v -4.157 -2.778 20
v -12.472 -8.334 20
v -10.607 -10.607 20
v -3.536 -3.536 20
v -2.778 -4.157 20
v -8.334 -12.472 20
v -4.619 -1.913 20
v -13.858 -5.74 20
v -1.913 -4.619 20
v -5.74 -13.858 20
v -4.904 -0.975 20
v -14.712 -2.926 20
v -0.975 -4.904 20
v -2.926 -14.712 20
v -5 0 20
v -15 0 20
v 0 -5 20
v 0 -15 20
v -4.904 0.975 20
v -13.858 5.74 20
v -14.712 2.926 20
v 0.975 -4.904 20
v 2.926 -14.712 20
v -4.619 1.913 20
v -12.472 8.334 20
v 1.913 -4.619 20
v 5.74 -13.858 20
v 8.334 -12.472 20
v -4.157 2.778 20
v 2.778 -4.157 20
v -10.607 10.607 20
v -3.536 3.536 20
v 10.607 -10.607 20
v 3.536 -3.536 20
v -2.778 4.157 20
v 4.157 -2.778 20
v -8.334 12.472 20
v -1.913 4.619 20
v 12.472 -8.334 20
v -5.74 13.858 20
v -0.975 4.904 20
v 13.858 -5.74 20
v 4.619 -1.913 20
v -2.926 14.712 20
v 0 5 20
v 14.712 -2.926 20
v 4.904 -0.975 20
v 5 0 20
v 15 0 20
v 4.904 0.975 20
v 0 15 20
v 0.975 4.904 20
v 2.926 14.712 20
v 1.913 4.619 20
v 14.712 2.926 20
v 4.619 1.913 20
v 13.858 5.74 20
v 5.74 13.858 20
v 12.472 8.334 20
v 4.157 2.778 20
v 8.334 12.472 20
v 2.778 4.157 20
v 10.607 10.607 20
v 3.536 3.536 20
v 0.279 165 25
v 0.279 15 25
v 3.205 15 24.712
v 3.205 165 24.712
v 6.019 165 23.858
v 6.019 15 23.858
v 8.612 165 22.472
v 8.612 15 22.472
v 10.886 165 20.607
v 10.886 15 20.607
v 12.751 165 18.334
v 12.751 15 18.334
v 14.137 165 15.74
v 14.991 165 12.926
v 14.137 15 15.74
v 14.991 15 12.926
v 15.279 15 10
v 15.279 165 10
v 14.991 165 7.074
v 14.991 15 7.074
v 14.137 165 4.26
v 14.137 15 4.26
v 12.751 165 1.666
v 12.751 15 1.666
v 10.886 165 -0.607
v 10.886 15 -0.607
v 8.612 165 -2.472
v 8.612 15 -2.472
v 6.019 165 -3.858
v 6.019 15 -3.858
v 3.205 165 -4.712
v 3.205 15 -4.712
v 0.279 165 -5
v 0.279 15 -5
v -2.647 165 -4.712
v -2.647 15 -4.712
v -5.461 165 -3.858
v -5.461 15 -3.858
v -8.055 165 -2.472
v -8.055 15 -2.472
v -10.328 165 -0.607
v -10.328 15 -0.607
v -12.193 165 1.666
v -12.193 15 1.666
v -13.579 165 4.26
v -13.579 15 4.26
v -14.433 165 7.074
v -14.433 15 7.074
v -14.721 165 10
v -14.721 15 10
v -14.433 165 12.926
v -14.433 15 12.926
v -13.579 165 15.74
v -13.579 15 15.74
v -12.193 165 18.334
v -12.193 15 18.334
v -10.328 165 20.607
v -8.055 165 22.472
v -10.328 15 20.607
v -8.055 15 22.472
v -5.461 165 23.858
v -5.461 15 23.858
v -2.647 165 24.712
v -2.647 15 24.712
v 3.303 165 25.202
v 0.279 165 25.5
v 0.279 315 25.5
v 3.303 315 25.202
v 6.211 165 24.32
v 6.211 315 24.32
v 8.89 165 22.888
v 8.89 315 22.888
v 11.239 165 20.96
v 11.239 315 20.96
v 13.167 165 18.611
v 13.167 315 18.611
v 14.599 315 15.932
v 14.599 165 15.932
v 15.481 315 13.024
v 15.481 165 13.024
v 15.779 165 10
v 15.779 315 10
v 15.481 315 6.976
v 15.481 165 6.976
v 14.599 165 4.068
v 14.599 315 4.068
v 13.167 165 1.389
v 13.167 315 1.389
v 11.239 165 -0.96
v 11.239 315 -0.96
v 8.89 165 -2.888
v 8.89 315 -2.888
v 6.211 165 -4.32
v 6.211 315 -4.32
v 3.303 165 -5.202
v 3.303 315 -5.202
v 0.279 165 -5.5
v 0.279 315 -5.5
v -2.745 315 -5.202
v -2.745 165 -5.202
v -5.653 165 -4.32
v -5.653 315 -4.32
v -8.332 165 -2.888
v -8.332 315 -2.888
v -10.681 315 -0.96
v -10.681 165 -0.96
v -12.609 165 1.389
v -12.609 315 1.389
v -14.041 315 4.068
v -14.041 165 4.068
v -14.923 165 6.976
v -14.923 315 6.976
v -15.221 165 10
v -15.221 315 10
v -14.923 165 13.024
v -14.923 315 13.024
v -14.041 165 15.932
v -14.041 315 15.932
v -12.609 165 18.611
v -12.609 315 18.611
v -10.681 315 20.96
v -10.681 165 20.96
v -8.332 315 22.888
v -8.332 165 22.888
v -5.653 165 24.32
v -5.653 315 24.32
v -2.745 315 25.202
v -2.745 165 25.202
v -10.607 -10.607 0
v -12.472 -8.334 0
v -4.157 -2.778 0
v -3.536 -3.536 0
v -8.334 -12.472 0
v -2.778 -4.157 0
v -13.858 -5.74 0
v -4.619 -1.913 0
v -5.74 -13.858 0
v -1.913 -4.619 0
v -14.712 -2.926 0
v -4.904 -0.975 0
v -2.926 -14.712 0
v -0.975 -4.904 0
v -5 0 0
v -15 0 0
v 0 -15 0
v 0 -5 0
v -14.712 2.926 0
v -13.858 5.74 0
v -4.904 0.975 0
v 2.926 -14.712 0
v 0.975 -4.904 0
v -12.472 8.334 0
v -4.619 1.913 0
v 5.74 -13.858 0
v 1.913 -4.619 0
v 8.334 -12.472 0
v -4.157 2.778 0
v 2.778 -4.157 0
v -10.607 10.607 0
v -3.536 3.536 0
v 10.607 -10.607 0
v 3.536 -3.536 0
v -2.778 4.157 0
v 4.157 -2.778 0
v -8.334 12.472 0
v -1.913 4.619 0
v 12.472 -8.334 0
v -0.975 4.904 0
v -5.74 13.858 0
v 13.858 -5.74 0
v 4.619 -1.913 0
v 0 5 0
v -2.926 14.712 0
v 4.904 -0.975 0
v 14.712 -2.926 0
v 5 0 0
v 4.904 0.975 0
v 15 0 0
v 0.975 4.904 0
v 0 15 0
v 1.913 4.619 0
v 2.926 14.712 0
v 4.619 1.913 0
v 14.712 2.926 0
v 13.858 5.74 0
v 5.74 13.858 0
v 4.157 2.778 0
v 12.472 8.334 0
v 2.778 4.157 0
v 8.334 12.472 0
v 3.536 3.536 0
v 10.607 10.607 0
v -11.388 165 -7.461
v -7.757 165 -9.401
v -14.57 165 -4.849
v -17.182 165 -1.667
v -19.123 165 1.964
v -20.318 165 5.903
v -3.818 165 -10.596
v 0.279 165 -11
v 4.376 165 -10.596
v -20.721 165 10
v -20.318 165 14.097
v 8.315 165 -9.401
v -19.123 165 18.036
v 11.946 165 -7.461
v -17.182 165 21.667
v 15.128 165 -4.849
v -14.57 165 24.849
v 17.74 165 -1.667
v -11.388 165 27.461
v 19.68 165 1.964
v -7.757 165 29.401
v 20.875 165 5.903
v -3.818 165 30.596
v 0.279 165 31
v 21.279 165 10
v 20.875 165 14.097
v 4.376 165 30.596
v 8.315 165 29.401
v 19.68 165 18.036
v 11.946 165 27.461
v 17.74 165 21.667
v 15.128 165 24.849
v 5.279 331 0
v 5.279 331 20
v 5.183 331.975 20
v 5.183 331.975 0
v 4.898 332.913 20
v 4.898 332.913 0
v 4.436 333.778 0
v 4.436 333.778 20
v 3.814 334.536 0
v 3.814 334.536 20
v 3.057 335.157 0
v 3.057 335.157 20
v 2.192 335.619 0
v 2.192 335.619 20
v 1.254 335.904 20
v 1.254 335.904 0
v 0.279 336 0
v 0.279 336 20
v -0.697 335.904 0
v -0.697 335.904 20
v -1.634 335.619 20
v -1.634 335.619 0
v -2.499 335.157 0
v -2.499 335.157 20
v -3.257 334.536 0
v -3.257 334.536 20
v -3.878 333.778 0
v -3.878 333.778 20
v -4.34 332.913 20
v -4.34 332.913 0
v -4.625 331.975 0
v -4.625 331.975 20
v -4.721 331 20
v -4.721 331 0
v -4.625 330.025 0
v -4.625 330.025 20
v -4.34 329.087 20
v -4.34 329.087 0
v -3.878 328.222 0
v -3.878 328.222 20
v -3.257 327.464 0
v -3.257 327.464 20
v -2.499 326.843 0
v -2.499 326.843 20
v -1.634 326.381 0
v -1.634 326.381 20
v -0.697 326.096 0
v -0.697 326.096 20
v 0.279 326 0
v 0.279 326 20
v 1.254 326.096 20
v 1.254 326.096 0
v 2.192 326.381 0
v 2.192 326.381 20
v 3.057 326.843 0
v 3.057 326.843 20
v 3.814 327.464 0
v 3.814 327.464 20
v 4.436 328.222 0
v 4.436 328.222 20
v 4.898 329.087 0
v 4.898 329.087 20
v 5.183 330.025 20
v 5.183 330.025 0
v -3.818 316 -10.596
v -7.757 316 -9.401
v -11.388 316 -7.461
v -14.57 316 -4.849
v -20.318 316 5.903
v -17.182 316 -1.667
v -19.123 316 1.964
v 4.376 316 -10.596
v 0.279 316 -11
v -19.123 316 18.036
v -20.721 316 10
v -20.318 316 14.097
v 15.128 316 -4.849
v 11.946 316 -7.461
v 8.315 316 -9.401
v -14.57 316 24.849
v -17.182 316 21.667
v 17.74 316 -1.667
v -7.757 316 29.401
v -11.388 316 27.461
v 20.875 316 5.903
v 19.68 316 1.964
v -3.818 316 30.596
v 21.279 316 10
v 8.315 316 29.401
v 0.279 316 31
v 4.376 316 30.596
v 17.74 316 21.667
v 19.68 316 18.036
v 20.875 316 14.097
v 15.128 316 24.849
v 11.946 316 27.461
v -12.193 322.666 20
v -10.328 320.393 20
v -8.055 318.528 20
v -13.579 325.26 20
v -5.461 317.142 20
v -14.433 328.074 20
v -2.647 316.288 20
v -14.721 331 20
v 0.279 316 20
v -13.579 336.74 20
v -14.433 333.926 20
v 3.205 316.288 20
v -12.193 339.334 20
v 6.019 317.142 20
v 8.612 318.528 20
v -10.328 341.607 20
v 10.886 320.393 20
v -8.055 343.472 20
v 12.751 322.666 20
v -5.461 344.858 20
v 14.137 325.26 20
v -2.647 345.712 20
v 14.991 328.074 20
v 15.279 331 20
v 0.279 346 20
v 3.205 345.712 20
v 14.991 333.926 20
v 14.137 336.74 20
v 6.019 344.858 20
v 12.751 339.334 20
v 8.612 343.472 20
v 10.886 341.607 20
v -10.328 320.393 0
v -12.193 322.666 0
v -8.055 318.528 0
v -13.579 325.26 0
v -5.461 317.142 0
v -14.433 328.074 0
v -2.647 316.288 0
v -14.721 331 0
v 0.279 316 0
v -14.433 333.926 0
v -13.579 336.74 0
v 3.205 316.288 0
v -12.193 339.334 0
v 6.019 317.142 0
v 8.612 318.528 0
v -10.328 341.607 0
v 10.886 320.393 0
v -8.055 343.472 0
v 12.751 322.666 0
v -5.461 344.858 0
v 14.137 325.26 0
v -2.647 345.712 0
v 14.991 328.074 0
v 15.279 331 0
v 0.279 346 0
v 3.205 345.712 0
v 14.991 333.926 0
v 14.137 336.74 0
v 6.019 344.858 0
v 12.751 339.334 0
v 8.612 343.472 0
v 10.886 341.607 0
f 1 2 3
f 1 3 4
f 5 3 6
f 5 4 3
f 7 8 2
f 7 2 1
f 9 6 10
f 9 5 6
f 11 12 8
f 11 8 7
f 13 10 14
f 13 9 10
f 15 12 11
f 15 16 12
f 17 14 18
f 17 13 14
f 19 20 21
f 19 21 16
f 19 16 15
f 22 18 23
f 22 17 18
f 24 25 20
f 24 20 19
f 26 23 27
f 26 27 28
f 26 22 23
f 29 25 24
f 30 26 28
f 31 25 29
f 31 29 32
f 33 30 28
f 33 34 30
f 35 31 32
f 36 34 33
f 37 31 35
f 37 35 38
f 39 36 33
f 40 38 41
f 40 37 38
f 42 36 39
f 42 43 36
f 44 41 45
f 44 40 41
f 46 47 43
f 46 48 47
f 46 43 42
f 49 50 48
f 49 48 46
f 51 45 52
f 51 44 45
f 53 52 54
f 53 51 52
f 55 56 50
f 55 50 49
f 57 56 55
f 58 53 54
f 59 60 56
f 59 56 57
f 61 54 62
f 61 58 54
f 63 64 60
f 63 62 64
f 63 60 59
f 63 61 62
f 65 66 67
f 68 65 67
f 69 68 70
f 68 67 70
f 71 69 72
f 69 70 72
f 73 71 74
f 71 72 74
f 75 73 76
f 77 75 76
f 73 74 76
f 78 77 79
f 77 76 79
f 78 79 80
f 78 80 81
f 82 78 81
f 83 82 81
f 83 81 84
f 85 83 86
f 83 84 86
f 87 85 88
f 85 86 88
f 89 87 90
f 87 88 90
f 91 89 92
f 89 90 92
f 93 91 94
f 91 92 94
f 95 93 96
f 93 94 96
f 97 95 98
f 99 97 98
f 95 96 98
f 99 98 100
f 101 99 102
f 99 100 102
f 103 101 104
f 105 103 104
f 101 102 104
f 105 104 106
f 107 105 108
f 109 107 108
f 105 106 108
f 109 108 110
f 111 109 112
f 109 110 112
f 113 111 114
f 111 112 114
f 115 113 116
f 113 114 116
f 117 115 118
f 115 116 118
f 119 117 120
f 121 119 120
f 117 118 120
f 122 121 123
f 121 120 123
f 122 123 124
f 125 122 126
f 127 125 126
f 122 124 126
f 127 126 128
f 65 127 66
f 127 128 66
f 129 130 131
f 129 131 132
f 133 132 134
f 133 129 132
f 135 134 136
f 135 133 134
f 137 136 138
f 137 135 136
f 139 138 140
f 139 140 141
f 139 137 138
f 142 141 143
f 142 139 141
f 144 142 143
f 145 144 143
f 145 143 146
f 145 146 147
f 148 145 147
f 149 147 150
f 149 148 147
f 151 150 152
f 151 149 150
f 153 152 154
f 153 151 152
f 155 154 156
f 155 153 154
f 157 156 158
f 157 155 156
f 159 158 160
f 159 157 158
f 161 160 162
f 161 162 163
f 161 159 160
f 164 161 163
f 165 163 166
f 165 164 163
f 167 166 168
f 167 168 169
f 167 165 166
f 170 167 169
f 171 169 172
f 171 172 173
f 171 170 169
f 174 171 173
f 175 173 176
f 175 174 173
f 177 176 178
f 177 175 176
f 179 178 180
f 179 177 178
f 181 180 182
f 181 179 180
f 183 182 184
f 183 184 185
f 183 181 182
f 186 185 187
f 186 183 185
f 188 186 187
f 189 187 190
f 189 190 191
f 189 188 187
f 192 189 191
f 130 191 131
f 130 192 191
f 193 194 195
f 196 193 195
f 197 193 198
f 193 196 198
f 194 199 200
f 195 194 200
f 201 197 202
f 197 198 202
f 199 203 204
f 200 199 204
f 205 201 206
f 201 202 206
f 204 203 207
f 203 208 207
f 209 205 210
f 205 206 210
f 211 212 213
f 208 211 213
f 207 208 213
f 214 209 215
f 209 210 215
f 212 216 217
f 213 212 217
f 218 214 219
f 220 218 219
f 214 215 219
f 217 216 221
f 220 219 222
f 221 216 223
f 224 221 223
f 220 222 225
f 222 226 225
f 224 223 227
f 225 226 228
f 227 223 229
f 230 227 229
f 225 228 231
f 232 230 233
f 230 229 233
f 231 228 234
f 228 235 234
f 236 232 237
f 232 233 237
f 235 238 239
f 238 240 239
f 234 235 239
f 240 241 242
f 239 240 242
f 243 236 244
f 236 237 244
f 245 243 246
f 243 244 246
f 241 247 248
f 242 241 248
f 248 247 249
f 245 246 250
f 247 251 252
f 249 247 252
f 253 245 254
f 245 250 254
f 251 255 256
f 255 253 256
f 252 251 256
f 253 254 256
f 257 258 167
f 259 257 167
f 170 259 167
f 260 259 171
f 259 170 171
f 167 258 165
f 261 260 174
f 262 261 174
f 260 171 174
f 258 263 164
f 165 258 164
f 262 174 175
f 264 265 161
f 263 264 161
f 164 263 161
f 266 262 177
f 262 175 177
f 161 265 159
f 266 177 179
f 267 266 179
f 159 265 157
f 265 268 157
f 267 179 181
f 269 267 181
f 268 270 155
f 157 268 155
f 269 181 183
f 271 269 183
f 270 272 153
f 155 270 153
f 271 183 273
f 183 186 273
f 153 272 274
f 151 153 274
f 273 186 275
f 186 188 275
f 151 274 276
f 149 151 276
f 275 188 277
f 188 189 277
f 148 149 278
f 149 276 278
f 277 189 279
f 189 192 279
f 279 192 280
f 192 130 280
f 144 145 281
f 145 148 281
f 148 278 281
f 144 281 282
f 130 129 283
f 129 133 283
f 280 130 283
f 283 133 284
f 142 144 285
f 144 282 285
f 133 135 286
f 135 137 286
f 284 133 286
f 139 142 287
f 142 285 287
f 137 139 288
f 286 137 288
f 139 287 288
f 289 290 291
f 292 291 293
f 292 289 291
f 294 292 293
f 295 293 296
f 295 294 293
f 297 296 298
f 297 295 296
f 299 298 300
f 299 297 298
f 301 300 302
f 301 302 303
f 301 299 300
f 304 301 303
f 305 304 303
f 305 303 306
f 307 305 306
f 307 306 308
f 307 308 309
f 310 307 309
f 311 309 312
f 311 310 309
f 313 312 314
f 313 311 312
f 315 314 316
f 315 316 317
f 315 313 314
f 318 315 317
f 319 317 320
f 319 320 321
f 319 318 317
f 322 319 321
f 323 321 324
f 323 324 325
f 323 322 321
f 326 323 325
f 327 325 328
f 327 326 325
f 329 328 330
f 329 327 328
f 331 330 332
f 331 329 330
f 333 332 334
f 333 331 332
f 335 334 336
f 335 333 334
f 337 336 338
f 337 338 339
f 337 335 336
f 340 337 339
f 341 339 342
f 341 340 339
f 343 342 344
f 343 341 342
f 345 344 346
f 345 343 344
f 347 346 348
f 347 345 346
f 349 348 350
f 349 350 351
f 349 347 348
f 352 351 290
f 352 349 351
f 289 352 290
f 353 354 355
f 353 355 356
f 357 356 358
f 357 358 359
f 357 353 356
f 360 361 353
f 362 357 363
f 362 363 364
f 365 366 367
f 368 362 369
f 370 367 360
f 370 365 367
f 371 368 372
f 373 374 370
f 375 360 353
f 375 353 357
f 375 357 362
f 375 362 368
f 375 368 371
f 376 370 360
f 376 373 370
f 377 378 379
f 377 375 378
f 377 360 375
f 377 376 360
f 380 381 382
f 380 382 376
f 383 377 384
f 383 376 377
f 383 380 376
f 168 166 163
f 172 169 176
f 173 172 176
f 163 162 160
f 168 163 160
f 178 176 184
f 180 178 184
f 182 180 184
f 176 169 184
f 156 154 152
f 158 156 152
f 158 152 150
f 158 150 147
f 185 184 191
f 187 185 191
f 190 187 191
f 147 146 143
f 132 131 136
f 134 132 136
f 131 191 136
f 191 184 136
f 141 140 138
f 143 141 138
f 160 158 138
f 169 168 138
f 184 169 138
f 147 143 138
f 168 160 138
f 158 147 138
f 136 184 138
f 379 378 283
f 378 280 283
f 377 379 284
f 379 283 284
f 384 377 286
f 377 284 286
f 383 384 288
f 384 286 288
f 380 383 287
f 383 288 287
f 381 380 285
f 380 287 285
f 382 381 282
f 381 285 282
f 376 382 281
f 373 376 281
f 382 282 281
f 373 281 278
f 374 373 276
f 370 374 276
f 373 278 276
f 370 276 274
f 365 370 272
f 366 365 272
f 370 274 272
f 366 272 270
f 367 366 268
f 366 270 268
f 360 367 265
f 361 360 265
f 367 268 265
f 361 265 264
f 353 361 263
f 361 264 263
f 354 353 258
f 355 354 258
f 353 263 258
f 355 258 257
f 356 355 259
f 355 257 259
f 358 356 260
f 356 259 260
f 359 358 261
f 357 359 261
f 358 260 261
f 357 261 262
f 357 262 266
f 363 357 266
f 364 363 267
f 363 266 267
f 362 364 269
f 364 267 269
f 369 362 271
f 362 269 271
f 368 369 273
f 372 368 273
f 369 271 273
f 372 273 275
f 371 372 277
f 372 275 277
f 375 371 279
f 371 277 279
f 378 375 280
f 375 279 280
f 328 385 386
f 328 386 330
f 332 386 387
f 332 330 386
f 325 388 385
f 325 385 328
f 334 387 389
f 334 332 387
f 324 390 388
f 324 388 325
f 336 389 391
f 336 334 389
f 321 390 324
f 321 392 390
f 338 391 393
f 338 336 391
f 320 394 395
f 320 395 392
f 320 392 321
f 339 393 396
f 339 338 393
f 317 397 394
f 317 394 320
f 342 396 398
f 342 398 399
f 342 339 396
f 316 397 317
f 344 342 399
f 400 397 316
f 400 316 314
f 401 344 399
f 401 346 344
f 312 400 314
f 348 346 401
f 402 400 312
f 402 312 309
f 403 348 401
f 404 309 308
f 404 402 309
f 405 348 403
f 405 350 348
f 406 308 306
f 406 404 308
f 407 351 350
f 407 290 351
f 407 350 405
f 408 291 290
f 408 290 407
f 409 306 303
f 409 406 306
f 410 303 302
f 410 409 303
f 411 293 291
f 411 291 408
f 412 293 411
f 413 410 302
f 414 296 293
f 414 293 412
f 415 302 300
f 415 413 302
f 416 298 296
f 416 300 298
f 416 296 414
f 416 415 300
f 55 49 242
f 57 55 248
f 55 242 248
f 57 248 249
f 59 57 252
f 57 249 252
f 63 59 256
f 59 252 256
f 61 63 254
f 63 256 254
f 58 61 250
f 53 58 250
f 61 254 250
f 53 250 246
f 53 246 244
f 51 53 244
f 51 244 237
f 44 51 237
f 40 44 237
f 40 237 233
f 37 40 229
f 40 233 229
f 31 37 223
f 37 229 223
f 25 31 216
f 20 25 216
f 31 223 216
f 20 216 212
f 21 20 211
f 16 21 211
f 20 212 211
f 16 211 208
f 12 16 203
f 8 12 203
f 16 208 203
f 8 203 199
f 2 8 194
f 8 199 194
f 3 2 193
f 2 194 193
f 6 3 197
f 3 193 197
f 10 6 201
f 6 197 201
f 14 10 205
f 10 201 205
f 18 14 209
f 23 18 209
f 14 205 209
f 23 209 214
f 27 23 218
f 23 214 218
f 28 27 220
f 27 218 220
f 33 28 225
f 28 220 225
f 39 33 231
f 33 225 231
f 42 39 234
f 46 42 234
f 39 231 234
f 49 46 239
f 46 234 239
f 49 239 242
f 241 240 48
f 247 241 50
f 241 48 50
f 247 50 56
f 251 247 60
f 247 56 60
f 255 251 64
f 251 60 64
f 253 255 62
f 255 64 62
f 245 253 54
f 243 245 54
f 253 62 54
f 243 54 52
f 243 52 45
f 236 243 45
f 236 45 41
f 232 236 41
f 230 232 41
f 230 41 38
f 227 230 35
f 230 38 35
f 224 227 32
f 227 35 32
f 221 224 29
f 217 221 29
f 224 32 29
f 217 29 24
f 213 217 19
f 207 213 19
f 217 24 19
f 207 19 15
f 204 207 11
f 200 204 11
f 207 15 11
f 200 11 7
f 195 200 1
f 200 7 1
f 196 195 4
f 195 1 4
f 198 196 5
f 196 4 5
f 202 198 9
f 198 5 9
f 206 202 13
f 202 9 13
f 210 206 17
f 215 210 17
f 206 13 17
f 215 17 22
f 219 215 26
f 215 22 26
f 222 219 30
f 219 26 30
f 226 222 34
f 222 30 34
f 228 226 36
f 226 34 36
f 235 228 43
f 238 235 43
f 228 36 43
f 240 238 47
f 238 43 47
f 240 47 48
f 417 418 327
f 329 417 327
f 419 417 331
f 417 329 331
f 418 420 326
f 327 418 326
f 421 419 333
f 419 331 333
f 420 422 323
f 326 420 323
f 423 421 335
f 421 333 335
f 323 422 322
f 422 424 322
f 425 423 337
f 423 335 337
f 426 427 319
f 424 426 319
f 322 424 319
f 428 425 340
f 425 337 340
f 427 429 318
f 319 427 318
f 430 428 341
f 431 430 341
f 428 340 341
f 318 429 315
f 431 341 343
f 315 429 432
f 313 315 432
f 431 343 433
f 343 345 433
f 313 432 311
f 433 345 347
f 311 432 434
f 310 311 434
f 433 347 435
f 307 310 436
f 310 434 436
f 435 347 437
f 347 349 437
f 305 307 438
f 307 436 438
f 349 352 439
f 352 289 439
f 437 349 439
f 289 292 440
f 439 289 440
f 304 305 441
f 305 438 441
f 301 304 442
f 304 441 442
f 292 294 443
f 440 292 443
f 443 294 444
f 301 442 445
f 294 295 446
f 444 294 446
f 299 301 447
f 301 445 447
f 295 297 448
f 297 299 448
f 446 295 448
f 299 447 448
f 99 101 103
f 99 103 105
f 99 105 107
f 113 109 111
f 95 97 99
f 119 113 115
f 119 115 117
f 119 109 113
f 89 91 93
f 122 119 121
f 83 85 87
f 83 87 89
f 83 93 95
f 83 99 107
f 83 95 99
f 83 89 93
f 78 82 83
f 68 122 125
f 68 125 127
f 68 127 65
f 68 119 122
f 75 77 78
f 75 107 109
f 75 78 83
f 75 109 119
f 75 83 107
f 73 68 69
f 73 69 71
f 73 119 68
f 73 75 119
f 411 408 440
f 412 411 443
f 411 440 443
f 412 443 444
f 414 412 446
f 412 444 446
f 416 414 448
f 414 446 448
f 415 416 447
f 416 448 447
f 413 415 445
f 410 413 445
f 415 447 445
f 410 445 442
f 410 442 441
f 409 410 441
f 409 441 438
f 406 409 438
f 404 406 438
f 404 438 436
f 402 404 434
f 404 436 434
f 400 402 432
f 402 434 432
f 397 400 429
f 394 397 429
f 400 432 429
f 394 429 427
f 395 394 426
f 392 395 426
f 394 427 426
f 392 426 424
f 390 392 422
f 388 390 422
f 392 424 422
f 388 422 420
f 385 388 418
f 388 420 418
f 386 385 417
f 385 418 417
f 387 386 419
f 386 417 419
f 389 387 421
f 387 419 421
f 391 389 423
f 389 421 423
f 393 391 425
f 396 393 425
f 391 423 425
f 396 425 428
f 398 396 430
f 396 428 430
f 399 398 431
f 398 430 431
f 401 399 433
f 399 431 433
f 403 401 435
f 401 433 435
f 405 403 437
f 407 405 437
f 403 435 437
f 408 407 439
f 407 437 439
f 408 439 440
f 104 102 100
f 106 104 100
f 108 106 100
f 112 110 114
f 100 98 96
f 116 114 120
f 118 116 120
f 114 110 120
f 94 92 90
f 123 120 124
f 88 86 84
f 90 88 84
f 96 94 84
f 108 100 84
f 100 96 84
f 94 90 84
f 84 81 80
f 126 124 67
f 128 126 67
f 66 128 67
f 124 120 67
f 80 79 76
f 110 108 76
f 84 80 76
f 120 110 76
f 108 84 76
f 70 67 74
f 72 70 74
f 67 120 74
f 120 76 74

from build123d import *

# Parameters (mm, degrees)
SZKIC1_R                    = 15
DODANIE_WYCI_GNI_CIE1_DEPTH = 20
SZKIC2_R                    = 5
WYTNIJ_WYCI_GNI_CIE1_DEPTH  = 20
SZKIC3_R                    = 15
DODANIE_WYCI_GNI_CIE2_DEPTH = 150
SZKIC4_R                    = 21
SZKIC4_R_2                  = 15.5
DODANIE_WYCI_GNI_CIE3_DEPTH = 150
SZKIC6_R                    = 21
DODANIE_WYCI_GNI_CIE4_DEPTH = 1
SZKIC7_R                    = 15
SZKIC7_R_2                  = 5
DODANIE_WYCI_GNI_CIE5_DEPTH = 20


with BuildPart() as part:
    # Szkic1 → Dodanie-wyciągnięcie1 (new body)
    with BuildSketch(Plane.XY):
        Circle(SZKIC1_R)
    extrude(amount=DODANIE_WYCI_GNI_CIE1_DEPTH)

    # Szkic2 → Wytnij-wyciągnięcie1 (cut)
    with BuildSketch(Plane.XY.offset(20)):
        Circle(SZKIC2_R)
    extrude(amount=-WYTNIJ_WYCI_GNI_CIE1_DEPTH, mode=Mode.SUBTRACT)


with BuildPart() as body_2:
    # Szkic3 → Dodanie-wyciągnięcie2 (new body)
    with BuildSketch(Plane(origin=(0, 15, 0), x_dir=(1, 0, 0), z_dir=(0, 1, 0))):
        with Locations(Location((0.27892553, -10, 0), (0, 0, 270))):
            Circle(SZKIC3_R)
    extrude(amount=DODANIE_WYCI_GNI_CIE2_DEPTH)


with BuildPart() as body_3:
    # Szkic4 → Dodanie-wyciągnięcie3 (new body)
    with BuildSketch(Plane(origin=(0, 165, 0), x_dir=(1, 0, 0), z_dir=(0, 1, 0))):
        with Locations(Location((0.27892553, -10, 0), (0, 0, 270))):
            Circle(SZKIC4_R)
        with Locations(Location((0.27892553, -10, 0), (0, 0, 270))):
            Circle(SZKIC4_R_2, mode=Mode.SUBTRACT)
    extrude(amount=DODANIE_WYCI_GNI_CIE3_DEPTH)

    # Szkic6 → Dodanie-wyciągnięcie4 (add)
    with BuildSketch(Plane(origin=(0, 315, 0), x_dir=(1, 0, 0), z_dir=(0, 1, 0))):
        with Locations(Location((0.27892553, -10, 0), (0, 0, 270))):
            Circle(SZKIC6_R)
    extrude(amount=DODANIE_WYCI_GNI_CIE4_DEPTH)


with BuildPart() as body_4:
    # Szkic7 → Dodanie-wyciągnięcie5 (new body)
    with BuildSketch(Plane.XY):
        with Locations((0.27892553, 331)):
            Circle(SZKIC7_R)
        with Locations((0.27892553, 331)):
            Circle(SZKIC7_R_2, mode=Mode.SUBTRACT)
    extrude(amount=DODANIE_WYCI_GNI_CIE5_DEPTH)


solid = Compound([part.part, body_2.part, body_3.part, body_4.part])
